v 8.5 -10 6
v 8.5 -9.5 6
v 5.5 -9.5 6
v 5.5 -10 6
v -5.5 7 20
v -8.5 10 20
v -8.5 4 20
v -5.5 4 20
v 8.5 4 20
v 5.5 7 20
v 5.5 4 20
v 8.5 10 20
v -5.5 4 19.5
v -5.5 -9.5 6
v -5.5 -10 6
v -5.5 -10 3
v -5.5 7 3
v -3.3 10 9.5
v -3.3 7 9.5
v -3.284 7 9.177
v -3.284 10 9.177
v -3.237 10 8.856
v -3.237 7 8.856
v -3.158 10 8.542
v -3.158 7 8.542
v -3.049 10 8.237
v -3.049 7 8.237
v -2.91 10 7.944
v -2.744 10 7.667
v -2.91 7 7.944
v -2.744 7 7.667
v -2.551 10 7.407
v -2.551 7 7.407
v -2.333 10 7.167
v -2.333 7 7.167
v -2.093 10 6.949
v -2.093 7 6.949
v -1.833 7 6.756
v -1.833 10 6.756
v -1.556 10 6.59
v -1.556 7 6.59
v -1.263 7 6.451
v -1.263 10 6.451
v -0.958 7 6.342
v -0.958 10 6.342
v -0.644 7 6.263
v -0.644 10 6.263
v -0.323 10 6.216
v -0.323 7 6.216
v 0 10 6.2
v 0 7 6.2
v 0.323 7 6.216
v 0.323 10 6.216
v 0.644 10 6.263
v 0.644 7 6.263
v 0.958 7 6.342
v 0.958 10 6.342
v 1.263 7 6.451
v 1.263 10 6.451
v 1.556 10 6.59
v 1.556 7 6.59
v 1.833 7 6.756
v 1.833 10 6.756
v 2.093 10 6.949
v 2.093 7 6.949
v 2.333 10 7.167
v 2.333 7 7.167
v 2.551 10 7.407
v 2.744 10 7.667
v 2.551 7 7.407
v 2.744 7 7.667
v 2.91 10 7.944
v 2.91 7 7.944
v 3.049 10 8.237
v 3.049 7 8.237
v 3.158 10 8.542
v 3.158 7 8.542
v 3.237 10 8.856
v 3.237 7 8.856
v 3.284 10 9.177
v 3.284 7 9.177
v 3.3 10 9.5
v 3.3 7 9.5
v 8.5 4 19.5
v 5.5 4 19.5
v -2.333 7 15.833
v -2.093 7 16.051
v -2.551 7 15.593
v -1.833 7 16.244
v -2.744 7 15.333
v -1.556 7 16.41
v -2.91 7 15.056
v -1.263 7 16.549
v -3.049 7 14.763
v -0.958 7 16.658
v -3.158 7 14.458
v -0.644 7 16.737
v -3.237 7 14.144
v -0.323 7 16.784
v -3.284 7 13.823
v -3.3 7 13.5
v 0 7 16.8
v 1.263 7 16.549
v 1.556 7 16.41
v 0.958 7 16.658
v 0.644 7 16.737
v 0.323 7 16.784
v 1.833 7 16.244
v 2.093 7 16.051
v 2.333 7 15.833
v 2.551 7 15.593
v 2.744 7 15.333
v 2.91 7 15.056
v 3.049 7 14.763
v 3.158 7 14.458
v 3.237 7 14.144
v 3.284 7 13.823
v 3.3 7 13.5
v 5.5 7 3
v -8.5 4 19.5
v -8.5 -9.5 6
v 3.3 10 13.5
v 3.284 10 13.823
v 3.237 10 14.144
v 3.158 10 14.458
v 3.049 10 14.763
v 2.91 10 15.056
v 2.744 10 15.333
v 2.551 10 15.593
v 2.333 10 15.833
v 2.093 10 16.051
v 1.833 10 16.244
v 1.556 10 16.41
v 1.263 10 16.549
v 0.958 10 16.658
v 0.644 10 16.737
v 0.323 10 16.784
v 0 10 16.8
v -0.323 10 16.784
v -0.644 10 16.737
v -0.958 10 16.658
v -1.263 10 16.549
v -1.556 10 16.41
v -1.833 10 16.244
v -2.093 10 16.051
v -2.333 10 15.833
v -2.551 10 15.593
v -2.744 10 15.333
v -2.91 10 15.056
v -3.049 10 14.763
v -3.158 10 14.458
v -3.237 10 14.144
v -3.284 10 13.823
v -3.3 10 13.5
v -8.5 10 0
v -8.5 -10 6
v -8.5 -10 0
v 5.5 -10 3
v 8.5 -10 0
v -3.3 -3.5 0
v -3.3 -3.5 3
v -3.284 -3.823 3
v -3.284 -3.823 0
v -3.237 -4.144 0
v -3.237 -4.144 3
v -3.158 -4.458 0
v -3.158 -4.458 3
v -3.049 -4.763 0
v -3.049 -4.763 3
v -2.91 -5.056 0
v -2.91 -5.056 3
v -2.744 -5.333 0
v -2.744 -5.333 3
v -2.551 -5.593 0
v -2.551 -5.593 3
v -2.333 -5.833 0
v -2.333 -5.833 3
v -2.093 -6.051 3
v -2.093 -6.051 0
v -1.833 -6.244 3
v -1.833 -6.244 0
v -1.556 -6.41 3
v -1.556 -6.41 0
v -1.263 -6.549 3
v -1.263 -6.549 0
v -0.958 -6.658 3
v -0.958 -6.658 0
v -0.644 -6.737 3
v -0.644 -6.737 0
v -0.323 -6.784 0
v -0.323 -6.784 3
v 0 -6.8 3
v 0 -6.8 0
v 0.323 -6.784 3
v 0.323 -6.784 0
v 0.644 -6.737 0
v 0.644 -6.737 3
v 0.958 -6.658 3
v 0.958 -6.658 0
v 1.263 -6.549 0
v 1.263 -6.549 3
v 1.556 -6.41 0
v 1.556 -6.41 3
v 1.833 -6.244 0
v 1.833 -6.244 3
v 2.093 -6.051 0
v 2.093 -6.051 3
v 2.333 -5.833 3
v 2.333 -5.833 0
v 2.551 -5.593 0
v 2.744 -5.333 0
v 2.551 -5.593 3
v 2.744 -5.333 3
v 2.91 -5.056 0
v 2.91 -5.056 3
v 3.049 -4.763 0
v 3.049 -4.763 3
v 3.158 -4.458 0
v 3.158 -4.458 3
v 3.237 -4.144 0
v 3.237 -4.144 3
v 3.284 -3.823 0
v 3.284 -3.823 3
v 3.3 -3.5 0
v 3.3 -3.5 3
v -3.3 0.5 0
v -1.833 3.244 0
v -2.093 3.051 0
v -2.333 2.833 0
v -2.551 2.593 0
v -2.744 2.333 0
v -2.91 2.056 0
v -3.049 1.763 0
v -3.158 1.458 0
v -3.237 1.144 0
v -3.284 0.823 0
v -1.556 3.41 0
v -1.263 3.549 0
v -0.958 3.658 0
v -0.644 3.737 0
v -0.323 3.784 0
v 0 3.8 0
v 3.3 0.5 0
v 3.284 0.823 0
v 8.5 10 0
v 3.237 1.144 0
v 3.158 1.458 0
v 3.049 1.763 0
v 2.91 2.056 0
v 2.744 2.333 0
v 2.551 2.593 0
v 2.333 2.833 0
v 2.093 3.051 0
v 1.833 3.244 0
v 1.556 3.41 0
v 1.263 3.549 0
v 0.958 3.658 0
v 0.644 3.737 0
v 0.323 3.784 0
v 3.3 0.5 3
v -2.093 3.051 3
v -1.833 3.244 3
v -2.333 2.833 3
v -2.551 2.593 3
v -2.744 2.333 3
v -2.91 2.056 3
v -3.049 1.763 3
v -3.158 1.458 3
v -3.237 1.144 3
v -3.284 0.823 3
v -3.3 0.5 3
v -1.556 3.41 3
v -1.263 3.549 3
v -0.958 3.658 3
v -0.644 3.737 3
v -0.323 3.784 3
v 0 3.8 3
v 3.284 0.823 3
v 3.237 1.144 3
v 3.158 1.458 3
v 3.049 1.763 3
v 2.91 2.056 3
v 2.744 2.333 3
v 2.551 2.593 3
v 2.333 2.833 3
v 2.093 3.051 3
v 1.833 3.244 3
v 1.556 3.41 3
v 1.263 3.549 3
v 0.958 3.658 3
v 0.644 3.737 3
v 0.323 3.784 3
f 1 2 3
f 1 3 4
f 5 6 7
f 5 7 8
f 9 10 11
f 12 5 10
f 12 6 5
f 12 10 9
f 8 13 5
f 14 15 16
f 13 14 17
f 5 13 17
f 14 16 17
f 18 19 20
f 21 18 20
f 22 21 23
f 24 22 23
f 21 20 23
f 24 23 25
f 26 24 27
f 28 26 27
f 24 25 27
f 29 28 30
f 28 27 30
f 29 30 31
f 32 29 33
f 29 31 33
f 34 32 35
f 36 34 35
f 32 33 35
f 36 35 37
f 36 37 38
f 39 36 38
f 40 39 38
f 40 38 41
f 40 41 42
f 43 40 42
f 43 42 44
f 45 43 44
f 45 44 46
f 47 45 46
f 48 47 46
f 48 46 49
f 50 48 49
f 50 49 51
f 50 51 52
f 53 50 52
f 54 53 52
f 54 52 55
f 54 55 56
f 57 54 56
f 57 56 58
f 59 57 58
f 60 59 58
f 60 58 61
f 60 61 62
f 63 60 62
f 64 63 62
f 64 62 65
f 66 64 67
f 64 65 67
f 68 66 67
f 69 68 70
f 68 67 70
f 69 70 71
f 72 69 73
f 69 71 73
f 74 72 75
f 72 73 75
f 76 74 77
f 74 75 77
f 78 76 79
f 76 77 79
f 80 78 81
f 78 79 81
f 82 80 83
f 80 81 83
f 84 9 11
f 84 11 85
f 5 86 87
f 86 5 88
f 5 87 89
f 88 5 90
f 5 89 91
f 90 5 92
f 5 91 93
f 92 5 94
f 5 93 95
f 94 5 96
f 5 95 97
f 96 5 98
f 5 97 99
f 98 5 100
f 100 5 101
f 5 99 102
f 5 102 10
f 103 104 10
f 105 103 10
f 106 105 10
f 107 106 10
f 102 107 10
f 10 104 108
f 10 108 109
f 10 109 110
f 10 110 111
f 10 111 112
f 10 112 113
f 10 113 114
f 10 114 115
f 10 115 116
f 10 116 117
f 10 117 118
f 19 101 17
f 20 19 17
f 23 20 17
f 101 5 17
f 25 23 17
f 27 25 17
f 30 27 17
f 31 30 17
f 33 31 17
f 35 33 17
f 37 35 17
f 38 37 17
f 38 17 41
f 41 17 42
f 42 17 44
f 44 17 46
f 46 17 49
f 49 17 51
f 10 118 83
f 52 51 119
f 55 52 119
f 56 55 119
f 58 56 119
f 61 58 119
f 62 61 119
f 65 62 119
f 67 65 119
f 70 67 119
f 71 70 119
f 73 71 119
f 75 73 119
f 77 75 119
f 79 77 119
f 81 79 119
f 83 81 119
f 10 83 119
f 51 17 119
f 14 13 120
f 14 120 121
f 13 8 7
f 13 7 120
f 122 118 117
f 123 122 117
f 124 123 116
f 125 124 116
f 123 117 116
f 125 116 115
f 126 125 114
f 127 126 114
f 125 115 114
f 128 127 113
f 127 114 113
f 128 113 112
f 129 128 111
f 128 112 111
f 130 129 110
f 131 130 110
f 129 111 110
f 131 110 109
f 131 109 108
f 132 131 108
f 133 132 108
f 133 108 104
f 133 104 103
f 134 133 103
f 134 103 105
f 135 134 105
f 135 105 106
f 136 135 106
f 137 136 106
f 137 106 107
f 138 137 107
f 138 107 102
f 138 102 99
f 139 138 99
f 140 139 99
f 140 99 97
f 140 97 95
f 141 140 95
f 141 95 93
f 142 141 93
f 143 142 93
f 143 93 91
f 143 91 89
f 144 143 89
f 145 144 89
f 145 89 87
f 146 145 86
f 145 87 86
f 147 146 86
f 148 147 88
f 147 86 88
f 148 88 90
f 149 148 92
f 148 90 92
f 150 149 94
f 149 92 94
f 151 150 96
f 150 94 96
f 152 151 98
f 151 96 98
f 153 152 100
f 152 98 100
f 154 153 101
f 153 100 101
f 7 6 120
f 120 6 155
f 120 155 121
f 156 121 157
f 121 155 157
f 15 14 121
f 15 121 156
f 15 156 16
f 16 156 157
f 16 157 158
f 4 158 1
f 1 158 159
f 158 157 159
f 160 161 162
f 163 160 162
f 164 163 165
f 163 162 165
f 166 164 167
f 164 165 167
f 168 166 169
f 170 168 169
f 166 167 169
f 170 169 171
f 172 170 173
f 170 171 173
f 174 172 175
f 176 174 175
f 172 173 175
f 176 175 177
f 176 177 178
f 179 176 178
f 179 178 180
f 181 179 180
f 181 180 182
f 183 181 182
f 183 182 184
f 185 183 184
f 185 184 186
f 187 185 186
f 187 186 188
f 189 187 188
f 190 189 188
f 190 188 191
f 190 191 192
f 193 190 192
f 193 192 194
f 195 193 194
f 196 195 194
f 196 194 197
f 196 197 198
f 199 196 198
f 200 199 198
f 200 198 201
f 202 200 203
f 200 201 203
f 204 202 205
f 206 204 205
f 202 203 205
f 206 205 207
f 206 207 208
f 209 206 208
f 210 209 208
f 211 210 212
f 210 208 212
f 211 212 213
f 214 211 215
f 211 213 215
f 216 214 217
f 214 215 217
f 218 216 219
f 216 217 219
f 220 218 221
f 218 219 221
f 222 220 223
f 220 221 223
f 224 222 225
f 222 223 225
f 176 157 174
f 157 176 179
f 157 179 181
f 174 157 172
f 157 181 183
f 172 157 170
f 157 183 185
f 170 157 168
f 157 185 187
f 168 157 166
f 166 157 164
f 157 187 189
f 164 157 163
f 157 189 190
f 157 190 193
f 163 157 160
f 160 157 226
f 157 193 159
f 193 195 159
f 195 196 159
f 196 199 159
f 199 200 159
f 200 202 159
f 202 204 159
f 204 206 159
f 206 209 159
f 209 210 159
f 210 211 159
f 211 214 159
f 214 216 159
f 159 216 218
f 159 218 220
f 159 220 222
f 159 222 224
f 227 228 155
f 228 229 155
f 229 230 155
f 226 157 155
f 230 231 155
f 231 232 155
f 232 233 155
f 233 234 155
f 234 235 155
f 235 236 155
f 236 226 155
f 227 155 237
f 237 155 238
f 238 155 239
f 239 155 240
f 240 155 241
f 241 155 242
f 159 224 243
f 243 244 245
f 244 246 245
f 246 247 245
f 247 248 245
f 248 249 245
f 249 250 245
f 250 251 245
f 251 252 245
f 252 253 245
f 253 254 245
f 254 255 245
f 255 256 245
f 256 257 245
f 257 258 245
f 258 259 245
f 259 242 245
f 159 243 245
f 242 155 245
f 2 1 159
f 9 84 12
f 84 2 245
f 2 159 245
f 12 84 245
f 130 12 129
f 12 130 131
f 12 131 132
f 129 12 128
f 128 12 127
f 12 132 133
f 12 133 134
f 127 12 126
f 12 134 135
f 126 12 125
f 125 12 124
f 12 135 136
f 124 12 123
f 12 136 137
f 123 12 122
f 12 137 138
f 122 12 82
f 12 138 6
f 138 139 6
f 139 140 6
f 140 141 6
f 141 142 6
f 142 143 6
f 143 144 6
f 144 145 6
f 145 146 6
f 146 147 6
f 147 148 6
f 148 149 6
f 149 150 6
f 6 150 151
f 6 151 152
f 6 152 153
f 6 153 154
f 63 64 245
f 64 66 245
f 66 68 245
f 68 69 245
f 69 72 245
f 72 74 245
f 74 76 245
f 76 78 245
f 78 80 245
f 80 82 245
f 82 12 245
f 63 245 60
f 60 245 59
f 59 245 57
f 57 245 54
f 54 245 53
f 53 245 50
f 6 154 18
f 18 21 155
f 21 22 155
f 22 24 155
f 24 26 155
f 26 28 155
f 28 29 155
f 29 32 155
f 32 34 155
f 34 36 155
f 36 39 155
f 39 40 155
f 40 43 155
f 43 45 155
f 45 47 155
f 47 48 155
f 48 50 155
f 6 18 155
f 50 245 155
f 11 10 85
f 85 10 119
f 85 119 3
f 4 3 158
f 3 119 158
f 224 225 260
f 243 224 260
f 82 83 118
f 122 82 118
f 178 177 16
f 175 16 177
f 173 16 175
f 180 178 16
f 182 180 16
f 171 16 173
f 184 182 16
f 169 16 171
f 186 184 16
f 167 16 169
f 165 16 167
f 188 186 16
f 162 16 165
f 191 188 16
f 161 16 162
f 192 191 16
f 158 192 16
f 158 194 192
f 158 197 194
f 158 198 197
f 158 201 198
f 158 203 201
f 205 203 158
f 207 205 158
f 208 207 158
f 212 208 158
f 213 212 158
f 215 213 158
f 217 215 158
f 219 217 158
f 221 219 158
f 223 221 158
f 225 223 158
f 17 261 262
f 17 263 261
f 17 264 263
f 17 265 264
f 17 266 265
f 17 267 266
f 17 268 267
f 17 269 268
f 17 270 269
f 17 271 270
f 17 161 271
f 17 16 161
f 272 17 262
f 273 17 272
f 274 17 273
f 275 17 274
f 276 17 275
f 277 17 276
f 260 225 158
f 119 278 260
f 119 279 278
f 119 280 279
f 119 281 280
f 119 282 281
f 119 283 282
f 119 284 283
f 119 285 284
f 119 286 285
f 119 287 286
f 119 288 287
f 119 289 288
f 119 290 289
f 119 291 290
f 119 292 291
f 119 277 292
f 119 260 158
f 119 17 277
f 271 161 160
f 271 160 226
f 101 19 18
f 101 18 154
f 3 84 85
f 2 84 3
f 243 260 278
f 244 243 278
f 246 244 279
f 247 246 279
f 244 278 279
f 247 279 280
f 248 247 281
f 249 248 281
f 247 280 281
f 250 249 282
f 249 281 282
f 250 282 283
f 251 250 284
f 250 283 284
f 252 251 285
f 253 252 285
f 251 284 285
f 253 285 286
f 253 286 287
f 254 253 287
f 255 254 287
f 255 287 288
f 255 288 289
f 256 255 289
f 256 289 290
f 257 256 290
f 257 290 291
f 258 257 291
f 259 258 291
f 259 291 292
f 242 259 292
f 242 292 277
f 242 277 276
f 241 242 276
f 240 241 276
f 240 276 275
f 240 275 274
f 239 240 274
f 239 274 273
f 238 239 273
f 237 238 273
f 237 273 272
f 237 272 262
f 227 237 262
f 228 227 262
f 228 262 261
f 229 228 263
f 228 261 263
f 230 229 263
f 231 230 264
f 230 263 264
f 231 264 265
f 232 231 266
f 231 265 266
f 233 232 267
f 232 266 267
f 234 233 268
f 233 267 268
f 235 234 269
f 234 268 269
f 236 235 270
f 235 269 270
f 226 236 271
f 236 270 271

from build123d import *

# Parameters (mm, degrees)
F2_W      = 17
F2_H      = 20
F3_DEPTH  = 3
F5_DEPTH  = 17
F7_DEPTH  = 25
F8_W      = 6.6
F8_H      = 4
F9_DEPTH  = 25
F10_W     = 6.6
F10_H     = 4
F11_DEPTH = 25


with BuildPart() as f3:
    # F2 (on Top) → F3 (new body)
    with BuildSketch(Plane.XY):
        Rectangle(F2_W, F2_H)
    extrude(amount=F3_DEPTH)

    # F4 (on face) → F5 (join)
    with BuildSketch(Plane.XY.offset(3)):
        Polygon((-5.5, 7), (5.5, 7), (5.5, -10), (8.5, -10), (8.5, 10), (-8.5, 10), (-8.5, -10), (-5.5, -10), align=None)
    extrude(amount=F5_DEPTH)

    # F6 (on face) → F7 (intersect)
    with BuildSketch(Plane.YZ.offset(8.5)):
        Polygon((-10, 6), (-10, 0), (10, 0), (10, 20), (4, 20), (4, 19.5), (-9.5, 6), align=None)
    extrude(amount=-F7_DEPTH, mode=Mode.INTERSECT)

    # F8 (on face) → F9 (cut)
    with BuildSketch(Plane.XY.offset(3)):
        with BuildLine():
            ThreePointArc((3.3, 0.5), (0, 3.8), (-3.3, 0.5))
            Line((-3.3, 0.5), (3.3, 0.5))
        make_face()
        with Locations((0, -1.5)):
            Rectangle(F8_W, F8_H)
        with BuildLine():
            Line((3.3, -3.5), (-3.3, -3.5))
            ThreePointArc((-3.3, -3.5), (0, -6.8), (3.3, -3.5))
        make_face()
    extrude(amount=-F9_DEPTH, mode=Mode.SUBTRACT)

    # F10 (on face) → F11 (cut)
    with BuildSketch(Plane.XZ.offset(-7)):
        with BuildLine():
            ThreePointArc((-3.3, 9.5), (0, 6.2), (3.3, 9.5))
            Line((3.3, 9.5), (-3.3, 9.5))
        make_face()
        with Locations((0, 11.5)):
            Rectangle(F10_W, F10_H)
        with BuildLine():
            Line((-3.3, 13.5), (3.3, 13.5))
            ThreePointArc((3.3, 13.5), (0, 16.8), (-3.3, 13.5))
        make_face()
    extrude(amount=-F11_DEPTH, mode=Mode.SUBTRACT)


solid = f3.part
